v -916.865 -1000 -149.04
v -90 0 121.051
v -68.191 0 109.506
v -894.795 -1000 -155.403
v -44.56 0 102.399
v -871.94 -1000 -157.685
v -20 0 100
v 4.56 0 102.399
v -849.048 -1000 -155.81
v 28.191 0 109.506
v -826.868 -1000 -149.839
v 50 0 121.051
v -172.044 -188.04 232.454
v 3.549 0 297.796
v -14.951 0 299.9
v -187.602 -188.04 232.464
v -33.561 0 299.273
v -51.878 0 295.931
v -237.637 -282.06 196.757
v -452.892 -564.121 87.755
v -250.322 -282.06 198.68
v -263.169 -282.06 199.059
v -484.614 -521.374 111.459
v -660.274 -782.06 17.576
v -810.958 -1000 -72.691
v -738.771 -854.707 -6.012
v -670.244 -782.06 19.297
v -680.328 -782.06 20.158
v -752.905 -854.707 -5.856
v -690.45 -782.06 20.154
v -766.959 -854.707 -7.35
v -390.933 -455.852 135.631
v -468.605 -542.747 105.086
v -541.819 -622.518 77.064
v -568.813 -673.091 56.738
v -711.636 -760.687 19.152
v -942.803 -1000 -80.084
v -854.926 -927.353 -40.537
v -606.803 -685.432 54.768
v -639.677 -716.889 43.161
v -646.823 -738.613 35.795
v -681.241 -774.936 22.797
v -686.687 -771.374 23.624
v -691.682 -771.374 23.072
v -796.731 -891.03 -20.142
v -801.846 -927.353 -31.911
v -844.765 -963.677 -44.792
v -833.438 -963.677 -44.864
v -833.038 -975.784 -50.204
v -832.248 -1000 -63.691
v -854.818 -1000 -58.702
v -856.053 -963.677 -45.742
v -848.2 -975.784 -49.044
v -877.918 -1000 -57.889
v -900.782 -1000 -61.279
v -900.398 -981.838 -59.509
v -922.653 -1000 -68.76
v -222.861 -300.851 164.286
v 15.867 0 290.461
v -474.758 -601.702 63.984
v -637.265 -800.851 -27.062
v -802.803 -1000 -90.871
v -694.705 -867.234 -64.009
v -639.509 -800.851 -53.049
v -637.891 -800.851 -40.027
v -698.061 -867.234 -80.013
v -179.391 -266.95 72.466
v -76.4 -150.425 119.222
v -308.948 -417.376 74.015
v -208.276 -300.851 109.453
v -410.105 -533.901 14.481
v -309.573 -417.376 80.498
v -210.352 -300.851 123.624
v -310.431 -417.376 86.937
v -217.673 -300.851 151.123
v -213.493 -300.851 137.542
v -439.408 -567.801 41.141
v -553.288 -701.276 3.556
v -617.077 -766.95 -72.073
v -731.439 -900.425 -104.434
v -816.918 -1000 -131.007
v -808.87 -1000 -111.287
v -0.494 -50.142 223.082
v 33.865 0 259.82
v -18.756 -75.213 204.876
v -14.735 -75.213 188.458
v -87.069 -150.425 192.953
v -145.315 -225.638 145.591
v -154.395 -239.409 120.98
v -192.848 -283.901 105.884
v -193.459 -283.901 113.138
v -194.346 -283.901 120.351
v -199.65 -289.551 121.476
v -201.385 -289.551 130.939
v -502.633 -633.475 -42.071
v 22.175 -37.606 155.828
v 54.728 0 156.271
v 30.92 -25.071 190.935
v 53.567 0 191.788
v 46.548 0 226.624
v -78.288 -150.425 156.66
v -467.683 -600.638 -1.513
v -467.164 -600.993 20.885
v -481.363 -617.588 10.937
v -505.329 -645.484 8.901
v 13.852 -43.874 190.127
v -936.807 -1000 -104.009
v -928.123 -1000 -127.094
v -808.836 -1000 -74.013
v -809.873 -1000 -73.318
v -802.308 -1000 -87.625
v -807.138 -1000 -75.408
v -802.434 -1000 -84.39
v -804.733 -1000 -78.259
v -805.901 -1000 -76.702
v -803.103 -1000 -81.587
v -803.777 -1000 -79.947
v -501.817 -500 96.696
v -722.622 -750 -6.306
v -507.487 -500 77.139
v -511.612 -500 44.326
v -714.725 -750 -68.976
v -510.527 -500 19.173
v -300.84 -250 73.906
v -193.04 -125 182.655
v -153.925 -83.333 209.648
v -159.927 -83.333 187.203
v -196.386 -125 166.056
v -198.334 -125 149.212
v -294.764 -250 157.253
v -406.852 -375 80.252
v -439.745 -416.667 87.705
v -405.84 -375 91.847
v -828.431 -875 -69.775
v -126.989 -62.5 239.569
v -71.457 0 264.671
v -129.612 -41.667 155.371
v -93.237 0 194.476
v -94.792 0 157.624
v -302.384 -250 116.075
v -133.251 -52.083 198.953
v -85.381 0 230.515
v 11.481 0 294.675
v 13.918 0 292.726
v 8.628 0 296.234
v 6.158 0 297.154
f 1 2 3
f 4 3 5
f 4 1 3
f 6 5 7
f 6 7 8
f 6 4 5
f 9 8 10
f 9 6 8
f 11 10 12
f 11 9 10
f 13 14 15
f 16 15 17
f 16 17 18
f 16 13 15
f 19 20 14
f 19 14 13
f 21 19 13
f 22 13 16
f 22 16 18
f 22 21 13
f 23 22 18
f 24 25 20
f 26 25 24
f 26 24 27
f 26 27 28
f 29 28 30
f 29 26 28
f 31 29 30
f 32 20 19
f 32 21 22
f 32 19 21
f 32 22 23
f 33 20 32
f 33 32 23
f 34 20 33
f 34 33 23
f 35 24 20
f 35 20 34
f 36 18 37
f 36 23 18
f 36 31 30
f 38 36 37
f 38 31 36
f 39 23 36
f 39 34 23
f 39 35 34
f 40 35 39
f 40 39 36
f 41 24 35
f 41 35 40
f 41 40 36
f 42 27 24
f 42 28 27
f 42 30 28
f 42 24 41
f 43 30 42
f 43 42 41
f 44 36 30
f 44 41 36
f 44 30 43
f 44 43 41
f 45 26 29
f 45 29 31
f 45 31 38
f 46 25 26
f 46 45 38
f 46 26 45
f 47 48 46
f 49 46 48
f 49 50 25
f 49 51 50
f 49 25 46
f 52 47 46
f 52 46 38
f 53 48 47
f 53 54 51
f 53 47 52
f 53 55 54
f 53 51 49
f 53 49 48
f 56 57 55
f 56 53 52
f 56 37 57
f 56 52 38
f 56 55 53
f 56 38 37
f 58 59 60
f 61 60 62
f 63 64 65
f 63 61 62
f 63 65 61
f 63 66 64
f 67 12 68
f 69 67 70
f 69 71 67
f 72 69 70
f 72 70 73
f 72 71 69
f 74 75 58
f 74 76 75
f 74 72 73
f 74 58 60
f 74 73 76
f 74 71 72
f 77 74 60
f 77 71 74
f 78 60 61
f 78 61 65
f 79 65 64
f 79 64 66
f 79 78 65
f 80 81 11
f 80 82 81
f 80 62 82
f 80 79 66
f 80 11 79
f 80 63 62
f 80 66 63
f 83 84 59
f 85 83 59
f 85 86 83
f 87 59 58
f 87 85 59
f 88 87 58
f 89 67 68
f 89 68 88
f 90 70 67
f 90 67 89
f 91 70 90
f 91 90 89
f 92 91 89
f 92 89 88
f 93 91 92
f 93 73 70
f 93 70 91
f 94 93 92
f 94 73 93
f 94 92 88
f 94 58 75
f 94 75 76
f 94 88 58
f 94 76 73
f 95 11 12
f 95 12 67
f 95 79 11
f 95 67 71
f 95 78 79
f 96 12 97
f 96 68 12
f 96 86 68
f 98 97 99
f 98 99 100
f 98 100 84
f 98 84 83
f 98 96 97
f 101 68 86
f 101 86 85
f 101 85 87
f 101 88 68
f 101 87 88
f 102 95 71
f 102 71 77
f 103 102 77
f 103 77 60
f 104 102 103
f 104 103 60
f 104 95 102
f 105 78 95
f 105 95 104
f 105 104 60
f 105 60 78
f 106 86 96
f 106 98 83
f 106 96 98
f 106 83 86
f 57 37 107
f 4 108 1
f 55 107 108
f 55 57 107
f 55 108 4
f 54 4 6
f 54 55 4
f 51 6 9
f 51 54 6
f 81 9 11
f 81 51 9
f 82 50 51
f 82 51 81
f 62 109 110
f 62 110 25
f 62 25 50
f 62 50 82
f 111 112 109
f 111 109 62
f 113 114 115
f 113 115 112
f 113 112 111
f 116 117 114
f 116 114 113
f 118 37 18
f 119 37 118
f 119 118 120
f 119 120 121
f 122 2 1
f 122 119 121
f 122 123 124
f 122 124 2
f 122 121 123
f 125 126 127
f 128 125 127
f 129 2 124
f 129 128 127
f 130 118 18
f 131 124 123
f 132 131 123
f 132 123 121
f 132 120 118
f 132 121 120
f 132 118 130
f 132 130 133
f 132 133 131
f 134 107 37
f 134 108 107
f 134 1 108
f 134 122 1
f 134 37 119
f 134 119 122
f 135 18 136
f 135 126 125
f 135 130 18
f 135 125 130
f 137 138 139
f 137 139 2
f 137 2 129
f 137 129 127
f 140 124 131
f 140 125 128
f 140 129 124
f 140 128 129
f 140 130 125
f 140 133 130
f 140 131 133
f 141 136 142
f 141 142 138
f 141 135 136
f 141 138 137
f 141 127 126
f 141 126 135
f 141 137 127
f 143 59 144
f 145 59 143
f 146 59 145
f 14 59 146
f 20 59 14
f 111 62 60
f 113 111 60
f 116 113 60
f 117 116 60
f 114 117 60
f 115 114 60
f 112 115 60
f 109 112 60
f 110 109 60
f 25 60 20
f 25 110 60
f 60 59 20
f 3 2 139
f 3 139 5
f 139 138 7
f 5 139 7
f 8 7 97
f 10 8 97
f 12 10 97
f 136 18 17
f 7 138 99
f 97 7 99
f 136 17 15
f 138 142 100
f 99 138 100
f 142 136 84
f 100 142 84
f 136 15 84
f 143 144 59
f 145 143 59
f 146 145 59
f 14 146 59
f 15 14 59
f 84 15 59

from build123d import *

# Parameters (mm, degrees)
F4_R = 20


with BuildPart() as f3:
    # F0 (on Front) → F3 section 0
    with BuildSketch(Plane.XZ):
        with BuildLine():
            ThreePointArc((50, 121.0509895272), (50.0865695268, 212.6648876477), (11.8783708075, 295.9310114541))
            ThreePointArc((11.8783708075, 295.9310114541), (-20, 300), (-51.8783708075, 295.9310114541))
            ThreePointArc((-51.8783708075, 295.9310114541), (-90.0865695268, 212.6648876477), (-90, 121.0509895272))
            ThreePointArc((-90, 121.0509895272), (-20, 100), (50, 121.0509895272))
        make_face()
    # F2 (on offset) → F3 section 1
    with BuildSketch(Plane.XZ.offset(1000)):
        with BuildLine():
            ThreePointArc((-826.8684139464, -149.838788357), (-810.4542950494, -115.6410672236), (-800.2728698805, -79.1000490193))
            ThreePointArc((-800.2728698805, -79.1000490193), (-871.6893152622, -57.6929389994), (-942.8033198489, -80.0842628104))
            ThreePointArc((-942.8033198489, -80.0842628104), (-932.7943314348, -115.6754881769), (-916.8648659769, -149.0396501233))
            ThreePointArc((-916.8648659769, -149.0396501233), (-871.9398589265, -157.6849103787), (-826.8684139464, -149.838788357))
        make_face()
    loft()

    # F4
    f4_edges = [f3.edges().sort_by_distance(p)[0] for p in [
        (-394.19725, -500, 108.415481),
    ]]
    fillet(f4_edges, radius=F4_R)


solid = f3.part
